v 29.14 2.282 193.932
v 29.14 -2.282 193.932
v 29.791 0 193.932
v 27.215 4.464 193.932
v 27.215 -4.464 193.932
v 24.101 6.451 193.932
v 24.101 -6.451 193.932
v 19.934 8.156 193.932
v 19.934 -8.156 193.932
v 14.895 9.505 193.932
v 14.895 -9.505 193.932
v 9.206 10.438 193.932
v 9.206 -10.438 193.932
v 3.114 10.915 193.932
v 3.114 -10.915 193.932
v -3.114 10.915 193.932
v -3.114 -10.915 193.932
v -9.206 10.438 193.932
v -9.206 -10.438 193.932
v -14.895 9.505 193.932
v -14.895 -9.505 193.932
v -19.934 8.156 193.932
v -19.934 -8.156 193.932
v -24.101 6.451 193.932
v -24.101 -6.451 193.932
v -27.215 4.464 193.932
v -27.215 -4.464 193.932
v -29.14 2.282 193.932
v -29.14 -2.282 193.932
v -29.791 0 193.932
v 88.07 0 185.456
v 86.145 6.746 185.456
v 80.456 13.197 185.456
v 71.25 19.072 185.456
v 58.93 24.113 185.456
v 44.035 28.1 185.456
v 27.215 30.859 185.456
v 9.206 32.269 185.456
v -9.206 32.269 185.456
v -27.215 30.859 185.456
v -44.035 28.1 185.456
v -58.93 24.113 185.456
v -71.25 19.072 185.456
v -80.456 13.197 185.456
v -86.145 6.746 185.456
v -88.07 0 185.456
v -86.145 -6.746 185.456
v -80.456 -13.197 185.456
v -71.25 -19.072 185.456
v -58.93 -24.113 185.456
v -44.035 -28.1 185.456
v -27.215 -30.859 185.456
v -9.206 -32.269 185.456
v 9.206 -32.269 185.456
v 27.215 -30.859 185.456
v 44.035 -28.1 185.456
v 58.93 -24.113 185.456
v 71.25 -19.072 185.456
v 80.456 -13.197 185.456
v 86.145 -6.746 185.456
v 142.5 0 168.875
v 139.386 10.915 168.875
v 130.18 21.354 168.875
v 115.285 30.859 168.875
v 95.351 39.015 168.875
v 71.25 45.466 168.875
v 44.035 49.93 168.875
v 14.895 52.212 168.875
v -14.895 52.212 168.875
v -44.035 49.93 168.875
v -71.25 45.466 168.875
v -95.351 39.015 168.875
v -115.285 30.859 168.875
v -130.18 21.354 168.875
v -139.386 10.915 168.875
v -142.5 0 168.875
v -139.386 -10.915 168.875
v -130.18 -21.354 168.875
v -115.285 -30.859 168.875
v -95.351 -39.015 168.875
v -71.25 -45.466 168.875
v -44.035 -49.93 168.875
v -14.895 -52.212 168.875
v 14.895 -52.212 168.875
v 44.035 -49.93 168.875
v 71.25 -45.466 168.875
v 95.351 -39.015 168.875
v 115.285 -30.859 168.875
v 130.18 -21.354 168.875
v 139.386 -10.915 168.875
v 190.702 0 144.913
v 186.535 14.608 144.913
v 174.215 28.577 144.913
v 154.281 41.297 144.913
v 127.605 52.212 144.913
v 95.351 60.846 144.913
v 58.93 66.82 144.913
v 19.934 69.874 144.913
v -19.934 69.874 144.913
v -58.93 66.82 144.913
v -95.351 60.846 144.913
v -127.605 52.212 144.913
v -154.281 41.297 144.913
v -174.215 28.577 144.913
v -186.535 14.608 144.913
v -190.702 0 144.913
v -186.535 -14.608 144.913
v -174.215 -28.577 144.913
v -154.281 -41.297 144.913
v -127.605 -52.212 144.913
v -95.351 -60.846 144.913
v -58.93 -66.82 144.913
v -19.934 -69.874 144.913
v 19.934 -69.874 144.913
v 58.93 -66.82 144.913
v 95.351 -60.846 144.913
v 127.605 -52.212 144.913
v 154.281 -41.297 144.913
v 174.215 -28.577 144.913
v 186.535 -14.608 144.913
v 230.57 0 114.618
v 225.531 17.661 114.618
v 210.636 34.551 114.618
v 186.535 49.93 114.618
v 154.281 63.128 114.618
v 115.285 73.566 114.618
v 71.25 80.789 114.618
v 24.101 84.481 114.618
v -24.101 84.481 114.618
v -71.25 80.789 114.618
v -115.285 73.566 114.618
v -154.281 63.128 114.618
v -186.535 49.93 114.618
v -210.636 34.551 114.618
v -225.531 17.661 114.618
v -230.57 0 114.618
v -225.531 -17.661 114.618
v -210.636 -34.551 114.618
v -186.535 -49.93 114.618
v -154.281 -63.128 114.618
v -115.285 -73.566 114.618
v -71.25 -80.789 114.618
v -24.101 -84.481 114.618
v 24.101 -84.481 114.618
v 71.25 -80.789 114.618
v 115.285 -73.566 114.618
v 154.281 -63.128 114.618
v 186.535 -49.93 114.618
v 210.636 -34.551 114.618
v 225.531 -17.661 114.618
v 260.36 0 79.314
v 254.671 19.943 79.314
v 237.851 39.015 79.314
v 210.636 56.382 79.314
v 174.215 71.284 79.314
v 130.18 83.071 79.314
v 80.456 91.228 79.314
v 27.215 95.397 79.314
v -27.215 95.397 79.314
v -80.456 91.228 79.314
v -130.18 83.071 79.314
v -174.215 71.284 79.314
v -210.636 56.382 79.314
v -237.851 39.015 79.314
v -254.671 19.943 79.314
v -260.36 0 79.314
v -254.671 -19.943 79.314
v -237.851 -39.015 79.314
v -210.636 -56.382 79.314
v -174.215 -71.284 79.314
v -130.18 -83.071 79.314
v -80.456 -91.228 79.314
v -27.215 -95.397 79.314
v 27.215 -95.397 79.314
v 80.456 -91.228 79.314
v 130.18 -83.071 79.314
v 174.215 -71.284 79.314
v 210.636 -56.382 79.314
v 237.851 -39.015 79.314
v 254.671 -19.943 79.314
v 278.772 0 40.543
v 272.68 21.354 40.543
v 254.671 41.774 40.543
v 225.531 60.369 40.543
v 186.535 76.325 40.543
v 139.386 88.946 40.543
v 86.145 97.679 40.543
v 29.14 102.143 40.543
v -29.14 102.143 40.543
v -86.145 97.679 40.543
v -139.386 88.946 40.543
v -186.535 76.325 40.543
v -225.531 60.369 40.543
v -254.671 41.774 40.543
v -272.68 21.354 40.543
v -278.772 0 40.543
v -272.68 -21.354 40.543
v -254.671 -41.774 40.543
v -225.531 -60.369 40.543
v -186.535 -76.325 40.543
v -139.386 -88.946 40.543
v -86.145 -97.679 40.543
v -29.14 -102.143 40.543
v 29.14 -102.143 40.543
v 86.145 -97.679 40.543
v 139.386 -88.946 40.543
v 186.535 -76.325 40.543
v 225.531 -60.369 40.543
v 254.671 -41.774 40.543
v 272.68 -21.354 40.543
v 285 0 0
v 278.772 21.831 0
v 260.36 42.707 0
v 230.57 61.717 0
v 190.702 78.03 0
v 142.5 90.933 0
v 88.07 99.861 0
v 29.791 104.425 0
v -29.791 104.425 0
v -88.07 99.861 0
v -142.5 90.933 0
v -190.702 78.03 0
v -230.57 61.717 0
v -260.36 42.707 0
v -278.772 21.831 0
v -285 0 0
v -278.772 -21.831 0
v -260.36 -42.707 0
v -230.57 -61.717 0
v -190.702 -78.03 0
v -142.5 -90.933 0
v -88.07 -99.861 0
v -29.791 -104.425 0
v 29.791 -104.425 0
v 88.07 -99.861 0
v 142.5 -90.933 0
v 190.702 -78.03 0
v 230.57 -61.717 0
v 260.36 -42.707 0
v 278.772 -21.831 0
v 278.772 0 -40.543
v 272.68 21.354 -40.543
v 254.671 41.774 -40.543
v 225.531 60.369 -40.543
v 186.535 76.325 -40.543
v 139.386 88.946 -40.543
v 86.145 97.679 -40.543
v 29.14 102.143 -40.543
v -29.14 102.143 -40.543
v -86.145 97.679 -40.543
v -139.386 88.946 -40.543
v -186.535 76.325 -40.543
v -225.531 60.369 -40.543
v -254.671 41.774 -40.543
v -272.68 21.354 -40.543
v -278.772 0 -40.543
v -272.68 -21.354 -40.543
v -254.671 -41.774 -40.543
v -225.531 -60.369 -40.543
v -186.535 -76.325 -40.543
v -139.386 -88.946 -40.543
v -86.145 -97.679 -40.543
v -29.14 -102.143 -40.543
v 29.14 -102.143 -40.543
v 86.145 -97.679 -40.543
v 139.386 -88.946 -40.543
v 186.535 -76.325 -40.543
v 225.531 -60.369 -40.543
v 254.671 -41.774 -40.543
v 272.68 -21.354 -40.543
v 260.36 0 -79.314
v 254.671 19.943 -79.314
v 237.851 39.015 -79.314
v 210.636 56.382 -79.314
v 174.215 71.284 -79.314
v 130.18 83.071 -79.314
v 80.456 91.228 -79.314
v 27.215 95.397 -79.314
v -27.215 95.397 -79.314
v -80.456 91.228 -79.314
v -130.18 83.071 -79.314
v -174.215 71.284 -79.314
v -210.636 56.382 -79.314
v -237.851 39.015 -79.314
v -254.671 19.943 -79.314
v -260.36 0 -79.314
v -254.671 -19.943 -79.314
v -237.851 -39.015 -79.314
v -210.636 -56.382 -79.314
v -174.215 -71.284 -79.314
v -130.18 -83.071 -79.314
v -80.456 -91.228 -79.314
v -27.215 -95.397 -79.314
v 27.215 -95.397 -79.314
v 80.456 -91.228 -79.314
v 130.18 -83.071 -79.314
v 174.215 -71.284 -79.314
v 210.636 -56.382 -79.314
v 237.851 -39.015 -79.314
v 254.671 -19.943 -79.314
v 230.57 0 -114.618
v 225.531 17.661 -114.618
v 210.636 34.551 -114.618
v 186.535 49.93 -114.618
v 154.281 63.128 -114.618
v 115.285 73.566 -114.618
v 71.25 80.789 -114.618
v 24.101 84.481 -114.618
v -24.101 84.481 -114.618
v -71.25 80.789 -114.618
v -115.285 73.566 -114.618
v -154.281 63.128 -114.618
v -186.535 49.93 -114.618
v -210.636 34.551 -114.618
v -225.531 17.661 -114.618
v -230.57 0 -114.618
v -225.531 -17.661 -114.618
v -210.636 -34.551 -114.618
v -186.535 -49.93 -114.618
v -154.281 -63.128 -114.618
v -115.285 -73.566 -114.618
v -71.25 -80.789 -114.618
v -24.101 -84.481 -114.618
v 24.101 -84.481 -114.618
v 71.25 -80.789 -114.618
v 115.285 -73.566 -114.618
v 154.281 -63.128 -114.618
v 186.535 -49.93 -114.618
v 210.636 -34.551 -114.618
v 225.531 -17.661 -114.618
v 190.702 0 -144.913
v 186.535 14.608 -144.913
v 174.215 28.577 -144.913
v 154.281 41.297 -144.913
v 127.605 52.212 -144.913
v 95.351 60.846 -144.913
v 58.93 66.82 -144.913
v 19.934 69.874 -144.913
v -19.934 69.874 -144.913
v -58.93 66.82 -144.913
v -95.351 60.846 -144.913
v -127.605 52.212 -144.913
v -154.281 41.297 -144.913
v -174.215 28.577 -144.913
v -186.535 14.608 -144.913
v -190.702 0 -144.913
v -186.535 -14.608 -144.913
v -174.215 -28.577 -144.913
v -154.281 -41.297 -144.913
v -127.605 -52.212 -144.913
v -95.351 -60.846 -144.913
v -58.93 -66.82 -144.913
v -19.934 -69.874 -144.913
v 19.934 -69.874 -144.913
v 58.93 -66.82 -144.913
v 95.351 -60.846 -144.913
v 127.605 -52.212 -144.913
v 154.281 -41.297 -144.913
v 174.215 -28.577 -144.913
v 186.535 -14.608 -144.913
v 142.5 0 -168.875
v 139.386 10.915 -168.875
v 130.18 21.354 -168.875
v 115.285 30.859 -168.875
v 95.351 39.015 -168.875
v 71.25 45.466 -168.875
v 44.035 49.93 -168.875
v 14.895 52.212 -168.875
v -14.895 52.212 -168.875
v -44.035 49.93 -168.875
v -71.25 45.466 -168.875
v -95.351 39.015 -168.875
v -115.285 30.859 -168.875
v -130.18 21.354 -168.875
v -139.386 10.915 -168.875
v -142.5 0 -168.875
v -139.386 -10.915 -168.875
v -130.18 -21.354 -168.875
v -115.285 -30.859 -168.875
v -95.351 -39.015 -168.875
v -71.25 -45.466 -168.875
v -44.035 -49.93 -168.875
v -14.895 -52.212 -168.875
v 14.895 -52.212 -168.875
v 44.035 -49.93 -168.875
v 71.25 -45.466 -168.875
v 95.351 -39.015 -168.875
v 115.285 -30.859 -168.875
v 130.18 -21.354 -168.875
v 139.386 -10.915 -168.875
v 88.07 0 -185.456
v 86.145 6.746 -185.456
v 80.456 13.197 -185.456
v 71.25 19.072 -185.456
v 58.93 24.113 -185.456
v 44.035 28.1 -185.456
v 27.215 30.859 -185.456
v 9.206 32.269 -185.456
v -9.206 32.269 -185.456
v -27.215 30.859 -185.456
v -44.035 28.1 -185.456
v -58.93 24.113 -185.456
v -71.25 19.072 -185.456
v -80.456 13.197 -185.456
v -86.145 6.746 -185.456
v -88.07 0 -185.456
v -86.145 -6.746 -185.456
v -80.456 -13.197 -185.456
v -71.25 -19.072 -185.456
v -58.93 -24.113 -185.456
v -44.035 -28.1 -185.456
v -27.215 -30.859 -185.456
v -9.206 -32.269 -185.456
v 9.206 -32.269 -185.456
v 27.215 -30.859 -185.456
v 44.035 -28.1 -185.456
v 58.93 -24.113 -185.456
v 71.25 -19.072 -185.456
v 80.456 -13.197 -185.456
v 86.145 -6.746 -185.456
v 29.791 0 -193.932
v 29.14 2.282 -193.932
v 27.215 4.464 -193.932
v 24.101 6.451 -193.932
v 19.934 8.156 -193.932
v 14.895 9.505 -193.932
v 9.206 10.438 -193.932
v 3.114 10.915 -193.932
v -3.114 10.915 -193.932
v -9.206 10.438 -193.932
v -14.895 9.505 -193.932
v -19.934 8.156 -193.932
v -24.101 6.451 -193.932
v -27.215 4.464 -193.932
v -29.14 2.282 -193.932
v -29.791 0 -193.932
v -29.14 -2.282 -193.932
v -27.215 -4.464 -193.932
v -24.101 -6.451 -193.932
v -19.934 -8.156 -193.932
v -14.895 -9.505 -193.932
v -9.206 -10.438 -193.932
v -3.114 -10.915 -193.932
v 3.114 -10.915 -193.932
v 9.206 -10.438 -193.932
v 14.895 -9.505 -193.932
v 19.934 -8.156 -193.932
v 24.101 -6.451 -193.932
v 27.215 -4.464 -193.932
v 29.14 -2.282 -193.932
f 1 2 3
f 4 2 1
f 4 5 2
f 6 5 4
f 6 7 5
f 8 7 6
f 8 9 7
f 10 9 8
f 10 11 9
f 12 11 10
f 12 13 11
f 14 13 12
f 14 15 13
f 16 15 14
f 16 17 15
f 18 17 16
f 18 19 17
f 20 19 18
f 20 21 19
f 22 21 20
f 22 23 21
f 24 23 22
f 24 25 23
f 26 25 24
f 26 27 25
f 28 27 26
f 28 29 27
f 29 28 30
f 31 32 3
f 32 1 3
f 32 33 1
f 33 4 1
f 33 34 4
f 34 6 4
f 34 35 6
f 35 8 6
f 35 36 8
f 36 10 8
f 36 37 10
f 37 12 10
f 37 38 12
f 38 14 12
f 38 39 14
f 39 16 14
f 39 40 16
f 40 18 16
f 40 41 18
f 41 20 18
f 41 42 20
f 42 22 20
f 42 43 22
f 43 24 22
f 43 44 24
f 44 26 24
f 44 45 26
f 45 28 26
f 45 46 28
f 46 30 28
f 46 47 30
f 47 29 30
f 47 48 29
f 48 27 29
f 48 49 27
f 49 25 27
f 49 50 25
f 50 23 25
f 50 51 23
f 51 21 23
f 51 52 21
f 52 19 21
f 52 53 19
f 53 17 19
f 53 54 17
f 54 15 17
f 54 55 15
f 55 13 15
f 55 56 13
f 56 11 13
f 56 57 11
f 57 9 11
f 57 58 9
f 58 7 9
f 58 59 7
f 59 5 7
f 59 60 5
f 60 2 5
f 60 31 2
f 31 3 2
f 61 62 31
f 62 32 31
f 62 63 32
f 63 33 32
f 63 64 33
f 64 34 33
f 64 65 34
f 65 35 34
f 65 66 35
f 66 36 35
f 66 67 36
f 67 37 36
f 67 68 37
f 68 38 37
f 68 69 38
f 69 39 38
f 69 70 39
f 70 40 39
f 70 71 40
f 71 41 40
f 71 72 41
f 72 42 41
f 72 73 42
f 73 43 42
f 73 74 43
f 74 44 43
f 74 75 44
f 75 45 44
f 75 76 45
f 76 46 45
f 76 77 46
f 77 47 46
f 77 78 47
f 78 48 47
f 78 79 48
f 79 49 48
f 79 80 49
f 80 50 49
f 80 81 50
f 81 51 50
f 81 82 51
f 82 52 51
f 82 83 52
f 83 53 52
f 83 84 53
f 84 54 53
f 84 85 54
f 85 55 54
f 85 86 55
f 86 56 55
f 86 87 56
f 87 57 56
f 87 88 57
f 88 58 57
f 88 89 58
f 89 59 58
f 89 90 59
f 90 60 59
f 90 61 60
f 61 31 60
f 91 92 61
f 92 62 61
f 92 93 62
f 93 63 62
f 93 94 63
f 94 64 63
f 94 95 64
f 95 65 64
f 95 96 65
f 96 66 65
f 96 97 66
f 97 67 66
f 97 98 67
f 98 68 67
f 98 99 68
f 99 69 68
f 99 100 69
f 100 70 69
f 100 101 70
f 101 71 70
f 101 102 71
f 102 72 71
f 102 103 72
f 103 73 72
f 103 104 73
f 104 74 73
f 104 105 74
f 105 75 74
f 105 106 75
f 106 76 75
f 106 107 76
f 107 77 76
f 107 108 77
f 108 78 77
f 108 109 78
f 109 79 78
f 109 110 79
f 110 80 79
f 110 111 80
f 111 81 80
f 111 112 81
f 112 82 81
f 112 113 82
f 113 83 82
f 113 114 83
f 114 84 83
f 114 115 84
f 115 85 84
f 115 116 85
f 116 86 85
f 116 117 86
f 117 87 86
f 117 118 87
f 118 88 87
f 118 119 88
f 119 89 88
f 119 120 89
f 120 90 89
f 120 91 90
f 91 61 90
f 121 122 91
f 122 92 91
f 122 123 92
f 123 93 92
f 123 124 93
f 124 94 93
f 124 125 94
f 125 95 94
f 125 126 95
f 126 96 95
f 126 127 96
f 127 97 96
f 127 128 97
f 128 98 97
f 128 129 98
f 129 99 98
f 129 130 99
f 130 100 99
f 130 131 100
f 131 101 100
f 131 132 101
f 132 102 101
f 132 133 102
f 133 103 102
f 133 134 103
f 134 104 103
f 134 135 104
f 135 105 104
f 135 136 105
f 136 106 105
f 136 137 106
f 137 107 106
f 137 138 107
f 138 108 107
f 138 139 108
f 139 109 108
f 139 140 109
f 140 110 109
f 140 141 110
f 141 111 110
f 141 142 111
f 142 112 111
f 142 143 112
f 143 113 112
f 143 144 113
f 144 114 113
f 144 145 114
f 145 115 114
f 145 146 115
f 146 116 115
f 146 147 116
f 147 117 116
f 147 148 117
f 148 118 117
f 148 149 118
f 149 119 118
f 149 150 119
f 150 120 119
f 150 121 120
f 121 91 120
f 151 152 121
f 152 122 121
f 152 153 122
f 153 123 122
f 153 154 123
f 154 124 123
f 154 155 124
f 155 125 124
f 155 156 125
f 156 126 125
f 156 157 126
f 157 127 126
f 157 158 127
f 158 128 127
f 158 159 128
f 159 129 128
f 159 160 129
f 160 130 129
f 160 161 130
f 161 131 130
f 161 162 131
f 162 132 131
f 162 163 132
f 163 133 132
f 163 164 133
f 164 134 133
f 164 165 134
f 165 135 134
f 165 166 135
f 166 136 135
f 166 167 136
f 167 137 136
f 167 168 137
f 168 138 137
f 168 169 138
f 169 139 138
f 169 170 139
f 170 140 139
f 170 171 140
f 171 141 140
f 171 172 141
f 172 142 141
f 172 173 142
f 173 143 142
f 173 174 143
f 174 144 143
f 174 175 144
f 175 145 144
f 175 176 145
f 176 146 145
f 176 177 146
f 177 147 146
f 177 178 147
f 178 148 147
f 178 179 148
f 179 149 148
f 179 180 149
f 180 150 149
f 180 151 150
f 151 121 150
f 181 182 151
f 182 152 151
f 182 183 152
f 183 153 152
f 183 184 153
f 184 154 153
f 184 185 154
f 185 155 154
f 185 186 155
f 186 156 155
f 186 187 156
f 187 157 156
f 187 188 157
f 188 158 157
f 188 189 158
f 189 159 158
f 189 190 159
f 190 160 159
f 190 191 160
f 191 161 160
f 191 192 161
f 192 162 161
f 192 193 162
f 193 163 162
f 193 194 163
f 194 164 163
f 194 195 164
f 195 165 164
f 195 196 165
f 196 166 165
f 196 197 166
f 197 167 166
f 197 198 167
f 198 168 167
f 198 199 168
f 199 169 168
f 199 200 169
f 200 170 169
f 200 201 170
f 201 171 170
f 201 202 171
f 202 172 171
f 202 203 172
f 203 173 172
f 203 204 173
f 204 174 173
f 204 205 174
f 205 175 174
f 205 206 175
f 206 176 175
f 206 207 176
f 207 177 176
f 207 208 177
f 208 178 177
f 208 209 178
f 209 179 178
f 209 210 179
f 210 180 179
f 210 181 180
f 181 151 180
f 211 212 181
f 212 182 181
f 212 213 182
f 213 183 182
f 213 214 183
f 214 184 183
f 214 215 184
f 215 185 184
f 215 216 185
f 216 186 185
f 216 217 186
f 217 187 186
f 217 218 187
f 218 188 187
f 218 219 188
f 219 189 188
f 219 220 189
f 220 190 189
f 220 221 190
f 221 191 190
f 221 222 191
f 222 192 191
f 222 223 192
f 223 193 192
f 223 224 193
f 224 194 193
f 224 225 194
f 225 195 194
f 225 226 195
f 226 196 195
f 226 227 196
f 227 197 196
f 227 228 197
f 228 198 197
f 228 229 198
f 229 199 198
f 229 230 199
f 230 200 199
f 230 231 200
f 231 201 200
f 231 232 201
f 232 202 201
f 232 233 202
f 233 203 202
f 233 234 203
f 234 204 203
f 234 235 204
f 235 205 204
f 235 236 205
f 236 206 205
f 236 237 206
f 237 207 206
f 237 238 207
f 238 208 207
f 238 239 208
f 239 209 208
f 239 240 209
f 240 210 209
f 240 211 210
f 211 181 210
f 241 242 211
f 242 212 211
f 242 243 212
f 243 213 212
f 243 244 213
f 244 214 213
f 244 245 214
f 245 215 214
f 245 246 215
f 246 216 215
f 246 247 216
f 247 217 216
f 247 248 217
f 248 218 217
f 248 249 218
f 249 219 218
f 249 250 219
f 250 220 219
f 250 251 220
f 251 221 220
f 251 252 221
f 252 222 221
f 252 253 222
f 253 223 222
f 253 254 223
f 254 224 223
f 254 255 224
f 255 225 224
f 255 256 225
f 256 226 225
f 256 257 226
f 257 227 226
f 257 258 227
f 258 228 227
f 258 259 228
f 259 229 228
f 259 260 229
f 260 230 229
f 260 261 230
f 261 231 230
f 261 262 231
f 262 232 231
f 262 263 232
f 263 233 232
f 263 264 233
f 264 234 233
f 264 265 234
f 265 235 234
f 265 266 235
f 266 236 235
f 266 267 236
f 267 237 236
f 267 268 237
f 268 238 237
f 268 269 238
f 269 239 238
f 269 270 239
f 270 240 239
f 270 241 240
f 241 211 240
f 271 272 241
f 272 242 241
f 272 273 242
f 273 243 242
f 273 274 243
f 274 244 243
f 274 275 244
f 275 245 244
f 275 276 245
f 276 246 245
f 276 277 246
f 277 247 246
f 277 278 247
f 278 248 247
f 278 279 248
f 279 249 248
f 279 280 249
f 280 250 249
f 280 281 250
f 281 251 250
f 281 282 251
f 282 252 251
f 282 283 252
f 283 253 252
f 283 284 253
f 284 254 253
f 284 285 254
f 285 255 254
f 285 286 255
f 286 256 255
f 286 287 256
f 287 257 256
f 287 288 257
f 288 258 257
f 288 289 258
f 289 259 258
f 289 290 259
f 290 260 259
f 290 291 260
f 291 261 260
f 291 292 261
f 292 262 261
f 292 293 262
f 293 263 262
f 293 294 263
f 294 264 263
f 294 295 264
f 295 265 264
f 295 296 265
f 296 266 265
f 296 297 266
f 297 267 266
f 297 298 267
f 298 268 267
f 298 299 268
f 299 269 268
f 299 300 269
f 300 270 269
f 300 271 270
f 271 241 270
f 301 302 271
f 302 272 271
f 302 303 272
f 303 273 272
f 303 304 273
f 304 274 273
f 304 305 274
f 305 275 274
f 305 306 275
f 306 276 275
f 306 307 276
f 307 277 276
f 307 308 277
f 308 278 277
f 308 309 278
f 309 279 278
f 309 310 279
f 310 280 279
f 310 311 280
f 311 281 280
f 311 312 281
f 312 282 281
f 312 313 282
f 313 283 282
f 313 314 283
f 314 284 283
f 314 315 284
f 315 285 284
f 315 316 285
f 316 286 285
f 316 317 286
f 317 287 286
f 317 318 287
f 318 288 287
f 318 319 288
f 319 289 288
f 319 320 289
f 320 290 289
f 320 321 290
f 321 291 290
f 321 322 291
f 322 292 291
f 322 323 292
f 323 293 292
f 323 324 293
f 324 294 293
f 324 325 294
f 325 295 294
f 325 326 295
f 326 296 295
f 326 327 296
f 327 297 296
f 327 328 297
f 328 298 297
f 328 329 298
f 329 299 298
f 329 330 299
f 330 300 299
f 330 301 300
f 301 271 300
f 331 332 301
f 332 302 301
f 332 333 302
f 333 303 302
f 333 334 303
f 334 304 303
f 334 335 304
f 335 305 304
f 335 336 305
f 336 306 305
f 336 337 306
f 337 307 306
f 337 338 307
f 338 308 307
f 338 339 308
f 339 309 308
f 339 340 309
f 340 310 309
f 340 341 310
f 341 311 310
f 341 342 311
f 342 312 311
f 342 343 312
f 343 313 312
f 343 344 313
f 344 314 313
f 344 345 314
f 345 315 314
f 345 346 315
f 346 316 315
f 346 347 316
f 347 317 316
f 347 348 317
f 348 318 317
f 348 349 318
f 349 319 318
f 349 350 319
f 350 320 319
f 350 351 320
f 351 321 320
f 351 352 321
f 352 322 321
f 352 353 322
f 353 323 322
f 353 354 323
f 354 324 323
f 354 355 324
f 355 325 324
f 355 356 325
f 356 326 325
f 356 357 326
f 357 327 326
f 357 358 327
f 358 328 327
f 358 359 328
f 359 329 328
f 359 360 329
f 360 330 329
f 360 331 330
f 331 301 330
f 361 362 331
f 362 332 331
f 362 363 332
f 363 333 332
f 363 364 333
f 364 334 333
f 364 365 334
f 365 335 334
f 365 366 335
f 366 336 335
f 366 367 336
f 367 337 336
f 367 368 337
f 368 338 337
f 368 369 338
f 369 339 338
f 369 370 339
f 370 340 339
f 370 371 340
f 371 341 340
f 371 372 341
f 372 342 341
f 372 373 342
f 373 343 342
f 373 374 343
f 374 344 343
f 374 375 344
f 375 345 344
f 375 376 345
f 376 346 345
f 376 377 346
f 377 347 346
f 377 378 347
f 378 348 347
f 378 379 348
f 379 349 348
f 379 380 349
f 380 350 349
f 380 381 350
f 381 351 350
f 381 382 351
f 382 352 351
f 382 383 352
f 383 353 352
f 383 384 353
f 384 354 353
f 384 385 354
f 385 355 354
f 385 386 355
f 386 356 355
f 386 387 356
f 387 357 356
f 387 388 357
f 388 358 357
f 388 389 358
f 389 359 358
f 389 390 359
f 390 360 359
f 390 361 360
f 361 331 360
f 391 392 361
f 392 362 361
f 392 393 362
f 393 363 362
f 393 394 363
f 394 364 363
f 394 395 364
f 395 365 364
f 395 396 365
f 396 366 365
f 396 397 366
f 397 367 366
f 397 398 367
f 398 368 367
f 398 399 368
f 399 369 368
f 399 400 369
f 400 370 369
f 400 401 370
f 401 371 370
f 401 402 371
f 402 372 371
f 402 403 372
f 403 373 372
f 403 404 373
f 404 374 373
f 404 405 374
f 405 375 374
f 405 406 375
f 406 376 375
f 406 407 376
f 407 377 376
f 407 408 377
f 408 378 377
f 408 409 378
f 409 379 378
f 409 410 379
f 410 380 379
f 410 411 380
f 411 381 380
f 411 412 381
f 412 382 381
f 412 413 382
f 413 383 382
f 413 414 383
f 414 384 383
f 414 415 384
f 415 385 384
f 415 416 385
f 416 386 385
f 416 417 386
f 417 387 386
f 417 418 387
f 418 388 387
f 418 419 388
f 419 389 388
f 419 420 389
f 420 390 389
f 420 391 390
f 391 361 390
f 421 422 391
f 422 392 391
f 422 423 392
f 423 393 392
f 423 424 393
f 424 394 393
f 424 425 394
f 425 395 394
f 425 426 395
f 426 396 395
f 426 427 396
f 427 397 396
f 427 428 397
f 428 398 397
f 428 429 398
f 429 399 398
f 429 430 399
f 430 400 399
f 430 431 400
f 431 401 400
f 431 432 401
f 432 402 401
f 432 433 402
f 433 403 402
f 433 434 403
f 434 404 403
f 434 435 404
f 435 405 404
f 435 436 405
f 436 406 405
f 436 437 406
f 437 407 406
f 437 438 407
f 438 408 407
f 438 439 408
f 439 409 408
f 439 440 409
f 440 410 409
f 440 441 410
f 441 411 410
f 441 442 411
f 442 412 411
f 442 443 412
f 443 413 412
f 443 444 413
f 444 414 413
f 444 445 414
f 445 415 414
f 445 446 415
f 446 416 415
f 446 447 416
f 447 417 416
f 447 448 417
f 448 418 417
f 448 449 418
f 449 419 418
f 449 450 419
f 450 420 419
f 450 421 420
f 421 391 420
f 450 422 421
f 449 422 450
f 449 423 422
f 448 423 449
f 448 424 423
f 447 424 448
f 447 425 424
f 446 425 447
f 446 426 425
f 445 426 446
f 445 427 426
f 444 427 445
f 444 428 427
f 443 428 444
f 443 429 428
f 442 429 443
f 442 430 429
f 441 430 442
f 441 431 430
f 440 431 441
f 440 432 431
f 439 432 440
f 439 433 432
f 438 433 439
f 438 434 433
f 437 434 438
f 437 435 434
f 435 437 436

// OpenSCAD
// Generated by SolidPython 1.0.1 on 2020-07-29 00:46:53


scale(v = [19, 7, 13]) {
	sphere(r = 15);
}
/***********************************************
*********      SolidPython code:      **********
************************************************
 
# import packages: SolidPython
from solid import *
from solid.utils import *
from itertools import chain, combinations, permutations


class Resize:

    def __init__(self, scad_file):
        self.scad_file = scad_file
        #self.scad_file = import_scad(scad_file)
        # cone/cylinder param:
        self.r1 = 0
        self.r2 = 0
        self.h = 0
        # rectangular prism param:
        self.w = 0
        self.l = 0
        # ellipse param:
        self.r = 0

    # import OpenScad code (file name corresponds to shape)


    # classify shape + parameters
    def assign(self, param1, param2, param3):
        if self.scad_file == 'cone.scad':
            self.r1 = param1
            self.r2 = param2
            self.h = param3
        elif self.scad_file == 'cylinder.scad':
            self.r1 = param1
            self.r2 = param2
            self.h = param3
        elif self.scad_file == 'rectangularPrism.scad':
            self.h = param1
            self.l = param2
            self.w = param3
        else:
            self.r = param1
            self.h = param2

    # resize parameters
    def iterate(self):
        x = range(3, 20, 2)
        i = 1
        if self.scad_file == 'cone.scad':
            tempList = list(permutations(x, 2))
            for temp in tempList:
                param1 = temp[0]
                param2 = temp[1]
                filepath = 'produced_scad_files/' + 'cone' + str(param1) + '_' + str(param2) + '_' + '.scad'
                scad_render_to_file(cylinder(h=param1, r1=param2, r2=0), filepath)

        elif self.scad_file == 'cylinder.scad':
            tempList = list(permutations(x, 3))
            for temp in tempList:
                param1 = temp[0]
                param2 = temp[1]
                filepath = 'produced_scad_files/' + 'cylinder' + str(param1) + '_' + str(param2) + '_' + '.scad'
                scad_render_to_file(cylinder(h=param1, r1=param2, r2=param2), filepath)

        elif self.scad_file == 'rectangularPrism.scad':
            tempList = list(permutations(x, 3))
            for temp in tempList:
                param1 = temp[0]
                param2 = temp[1]
                param3 = temp[2]
                filepath = 'produced_scad_files/' + 'rectangularPrism' + str(param1) + '_' + str(param2) + '_' + str(
                    param3) + '.scad'
                scad_render_to_file(cube(size=(param1, param2, param3)), filepath)

        elif self.scad_file == 'ellipse.scad':
            tempList = list(permutations(x, 4))
            for temp in tempList:
                param1 = temp[0]
                param2 = temp[1]
                param3 = temp[2]
                param4 = temp[3]
                filepath = 'produced_scad_files/' + 'ellipse' + str(param1) + '_' + str(param2) + '_' + str(param3) + '_' + str(param4) + '.scad'
                scad_render_to_file(scale([param1, param2, param3])(sphere(r=param4)), filepath)

    def render_to_scadfile(self):
        scad_render_to_file(scad, 'example.scad') 
 
************************************************/
